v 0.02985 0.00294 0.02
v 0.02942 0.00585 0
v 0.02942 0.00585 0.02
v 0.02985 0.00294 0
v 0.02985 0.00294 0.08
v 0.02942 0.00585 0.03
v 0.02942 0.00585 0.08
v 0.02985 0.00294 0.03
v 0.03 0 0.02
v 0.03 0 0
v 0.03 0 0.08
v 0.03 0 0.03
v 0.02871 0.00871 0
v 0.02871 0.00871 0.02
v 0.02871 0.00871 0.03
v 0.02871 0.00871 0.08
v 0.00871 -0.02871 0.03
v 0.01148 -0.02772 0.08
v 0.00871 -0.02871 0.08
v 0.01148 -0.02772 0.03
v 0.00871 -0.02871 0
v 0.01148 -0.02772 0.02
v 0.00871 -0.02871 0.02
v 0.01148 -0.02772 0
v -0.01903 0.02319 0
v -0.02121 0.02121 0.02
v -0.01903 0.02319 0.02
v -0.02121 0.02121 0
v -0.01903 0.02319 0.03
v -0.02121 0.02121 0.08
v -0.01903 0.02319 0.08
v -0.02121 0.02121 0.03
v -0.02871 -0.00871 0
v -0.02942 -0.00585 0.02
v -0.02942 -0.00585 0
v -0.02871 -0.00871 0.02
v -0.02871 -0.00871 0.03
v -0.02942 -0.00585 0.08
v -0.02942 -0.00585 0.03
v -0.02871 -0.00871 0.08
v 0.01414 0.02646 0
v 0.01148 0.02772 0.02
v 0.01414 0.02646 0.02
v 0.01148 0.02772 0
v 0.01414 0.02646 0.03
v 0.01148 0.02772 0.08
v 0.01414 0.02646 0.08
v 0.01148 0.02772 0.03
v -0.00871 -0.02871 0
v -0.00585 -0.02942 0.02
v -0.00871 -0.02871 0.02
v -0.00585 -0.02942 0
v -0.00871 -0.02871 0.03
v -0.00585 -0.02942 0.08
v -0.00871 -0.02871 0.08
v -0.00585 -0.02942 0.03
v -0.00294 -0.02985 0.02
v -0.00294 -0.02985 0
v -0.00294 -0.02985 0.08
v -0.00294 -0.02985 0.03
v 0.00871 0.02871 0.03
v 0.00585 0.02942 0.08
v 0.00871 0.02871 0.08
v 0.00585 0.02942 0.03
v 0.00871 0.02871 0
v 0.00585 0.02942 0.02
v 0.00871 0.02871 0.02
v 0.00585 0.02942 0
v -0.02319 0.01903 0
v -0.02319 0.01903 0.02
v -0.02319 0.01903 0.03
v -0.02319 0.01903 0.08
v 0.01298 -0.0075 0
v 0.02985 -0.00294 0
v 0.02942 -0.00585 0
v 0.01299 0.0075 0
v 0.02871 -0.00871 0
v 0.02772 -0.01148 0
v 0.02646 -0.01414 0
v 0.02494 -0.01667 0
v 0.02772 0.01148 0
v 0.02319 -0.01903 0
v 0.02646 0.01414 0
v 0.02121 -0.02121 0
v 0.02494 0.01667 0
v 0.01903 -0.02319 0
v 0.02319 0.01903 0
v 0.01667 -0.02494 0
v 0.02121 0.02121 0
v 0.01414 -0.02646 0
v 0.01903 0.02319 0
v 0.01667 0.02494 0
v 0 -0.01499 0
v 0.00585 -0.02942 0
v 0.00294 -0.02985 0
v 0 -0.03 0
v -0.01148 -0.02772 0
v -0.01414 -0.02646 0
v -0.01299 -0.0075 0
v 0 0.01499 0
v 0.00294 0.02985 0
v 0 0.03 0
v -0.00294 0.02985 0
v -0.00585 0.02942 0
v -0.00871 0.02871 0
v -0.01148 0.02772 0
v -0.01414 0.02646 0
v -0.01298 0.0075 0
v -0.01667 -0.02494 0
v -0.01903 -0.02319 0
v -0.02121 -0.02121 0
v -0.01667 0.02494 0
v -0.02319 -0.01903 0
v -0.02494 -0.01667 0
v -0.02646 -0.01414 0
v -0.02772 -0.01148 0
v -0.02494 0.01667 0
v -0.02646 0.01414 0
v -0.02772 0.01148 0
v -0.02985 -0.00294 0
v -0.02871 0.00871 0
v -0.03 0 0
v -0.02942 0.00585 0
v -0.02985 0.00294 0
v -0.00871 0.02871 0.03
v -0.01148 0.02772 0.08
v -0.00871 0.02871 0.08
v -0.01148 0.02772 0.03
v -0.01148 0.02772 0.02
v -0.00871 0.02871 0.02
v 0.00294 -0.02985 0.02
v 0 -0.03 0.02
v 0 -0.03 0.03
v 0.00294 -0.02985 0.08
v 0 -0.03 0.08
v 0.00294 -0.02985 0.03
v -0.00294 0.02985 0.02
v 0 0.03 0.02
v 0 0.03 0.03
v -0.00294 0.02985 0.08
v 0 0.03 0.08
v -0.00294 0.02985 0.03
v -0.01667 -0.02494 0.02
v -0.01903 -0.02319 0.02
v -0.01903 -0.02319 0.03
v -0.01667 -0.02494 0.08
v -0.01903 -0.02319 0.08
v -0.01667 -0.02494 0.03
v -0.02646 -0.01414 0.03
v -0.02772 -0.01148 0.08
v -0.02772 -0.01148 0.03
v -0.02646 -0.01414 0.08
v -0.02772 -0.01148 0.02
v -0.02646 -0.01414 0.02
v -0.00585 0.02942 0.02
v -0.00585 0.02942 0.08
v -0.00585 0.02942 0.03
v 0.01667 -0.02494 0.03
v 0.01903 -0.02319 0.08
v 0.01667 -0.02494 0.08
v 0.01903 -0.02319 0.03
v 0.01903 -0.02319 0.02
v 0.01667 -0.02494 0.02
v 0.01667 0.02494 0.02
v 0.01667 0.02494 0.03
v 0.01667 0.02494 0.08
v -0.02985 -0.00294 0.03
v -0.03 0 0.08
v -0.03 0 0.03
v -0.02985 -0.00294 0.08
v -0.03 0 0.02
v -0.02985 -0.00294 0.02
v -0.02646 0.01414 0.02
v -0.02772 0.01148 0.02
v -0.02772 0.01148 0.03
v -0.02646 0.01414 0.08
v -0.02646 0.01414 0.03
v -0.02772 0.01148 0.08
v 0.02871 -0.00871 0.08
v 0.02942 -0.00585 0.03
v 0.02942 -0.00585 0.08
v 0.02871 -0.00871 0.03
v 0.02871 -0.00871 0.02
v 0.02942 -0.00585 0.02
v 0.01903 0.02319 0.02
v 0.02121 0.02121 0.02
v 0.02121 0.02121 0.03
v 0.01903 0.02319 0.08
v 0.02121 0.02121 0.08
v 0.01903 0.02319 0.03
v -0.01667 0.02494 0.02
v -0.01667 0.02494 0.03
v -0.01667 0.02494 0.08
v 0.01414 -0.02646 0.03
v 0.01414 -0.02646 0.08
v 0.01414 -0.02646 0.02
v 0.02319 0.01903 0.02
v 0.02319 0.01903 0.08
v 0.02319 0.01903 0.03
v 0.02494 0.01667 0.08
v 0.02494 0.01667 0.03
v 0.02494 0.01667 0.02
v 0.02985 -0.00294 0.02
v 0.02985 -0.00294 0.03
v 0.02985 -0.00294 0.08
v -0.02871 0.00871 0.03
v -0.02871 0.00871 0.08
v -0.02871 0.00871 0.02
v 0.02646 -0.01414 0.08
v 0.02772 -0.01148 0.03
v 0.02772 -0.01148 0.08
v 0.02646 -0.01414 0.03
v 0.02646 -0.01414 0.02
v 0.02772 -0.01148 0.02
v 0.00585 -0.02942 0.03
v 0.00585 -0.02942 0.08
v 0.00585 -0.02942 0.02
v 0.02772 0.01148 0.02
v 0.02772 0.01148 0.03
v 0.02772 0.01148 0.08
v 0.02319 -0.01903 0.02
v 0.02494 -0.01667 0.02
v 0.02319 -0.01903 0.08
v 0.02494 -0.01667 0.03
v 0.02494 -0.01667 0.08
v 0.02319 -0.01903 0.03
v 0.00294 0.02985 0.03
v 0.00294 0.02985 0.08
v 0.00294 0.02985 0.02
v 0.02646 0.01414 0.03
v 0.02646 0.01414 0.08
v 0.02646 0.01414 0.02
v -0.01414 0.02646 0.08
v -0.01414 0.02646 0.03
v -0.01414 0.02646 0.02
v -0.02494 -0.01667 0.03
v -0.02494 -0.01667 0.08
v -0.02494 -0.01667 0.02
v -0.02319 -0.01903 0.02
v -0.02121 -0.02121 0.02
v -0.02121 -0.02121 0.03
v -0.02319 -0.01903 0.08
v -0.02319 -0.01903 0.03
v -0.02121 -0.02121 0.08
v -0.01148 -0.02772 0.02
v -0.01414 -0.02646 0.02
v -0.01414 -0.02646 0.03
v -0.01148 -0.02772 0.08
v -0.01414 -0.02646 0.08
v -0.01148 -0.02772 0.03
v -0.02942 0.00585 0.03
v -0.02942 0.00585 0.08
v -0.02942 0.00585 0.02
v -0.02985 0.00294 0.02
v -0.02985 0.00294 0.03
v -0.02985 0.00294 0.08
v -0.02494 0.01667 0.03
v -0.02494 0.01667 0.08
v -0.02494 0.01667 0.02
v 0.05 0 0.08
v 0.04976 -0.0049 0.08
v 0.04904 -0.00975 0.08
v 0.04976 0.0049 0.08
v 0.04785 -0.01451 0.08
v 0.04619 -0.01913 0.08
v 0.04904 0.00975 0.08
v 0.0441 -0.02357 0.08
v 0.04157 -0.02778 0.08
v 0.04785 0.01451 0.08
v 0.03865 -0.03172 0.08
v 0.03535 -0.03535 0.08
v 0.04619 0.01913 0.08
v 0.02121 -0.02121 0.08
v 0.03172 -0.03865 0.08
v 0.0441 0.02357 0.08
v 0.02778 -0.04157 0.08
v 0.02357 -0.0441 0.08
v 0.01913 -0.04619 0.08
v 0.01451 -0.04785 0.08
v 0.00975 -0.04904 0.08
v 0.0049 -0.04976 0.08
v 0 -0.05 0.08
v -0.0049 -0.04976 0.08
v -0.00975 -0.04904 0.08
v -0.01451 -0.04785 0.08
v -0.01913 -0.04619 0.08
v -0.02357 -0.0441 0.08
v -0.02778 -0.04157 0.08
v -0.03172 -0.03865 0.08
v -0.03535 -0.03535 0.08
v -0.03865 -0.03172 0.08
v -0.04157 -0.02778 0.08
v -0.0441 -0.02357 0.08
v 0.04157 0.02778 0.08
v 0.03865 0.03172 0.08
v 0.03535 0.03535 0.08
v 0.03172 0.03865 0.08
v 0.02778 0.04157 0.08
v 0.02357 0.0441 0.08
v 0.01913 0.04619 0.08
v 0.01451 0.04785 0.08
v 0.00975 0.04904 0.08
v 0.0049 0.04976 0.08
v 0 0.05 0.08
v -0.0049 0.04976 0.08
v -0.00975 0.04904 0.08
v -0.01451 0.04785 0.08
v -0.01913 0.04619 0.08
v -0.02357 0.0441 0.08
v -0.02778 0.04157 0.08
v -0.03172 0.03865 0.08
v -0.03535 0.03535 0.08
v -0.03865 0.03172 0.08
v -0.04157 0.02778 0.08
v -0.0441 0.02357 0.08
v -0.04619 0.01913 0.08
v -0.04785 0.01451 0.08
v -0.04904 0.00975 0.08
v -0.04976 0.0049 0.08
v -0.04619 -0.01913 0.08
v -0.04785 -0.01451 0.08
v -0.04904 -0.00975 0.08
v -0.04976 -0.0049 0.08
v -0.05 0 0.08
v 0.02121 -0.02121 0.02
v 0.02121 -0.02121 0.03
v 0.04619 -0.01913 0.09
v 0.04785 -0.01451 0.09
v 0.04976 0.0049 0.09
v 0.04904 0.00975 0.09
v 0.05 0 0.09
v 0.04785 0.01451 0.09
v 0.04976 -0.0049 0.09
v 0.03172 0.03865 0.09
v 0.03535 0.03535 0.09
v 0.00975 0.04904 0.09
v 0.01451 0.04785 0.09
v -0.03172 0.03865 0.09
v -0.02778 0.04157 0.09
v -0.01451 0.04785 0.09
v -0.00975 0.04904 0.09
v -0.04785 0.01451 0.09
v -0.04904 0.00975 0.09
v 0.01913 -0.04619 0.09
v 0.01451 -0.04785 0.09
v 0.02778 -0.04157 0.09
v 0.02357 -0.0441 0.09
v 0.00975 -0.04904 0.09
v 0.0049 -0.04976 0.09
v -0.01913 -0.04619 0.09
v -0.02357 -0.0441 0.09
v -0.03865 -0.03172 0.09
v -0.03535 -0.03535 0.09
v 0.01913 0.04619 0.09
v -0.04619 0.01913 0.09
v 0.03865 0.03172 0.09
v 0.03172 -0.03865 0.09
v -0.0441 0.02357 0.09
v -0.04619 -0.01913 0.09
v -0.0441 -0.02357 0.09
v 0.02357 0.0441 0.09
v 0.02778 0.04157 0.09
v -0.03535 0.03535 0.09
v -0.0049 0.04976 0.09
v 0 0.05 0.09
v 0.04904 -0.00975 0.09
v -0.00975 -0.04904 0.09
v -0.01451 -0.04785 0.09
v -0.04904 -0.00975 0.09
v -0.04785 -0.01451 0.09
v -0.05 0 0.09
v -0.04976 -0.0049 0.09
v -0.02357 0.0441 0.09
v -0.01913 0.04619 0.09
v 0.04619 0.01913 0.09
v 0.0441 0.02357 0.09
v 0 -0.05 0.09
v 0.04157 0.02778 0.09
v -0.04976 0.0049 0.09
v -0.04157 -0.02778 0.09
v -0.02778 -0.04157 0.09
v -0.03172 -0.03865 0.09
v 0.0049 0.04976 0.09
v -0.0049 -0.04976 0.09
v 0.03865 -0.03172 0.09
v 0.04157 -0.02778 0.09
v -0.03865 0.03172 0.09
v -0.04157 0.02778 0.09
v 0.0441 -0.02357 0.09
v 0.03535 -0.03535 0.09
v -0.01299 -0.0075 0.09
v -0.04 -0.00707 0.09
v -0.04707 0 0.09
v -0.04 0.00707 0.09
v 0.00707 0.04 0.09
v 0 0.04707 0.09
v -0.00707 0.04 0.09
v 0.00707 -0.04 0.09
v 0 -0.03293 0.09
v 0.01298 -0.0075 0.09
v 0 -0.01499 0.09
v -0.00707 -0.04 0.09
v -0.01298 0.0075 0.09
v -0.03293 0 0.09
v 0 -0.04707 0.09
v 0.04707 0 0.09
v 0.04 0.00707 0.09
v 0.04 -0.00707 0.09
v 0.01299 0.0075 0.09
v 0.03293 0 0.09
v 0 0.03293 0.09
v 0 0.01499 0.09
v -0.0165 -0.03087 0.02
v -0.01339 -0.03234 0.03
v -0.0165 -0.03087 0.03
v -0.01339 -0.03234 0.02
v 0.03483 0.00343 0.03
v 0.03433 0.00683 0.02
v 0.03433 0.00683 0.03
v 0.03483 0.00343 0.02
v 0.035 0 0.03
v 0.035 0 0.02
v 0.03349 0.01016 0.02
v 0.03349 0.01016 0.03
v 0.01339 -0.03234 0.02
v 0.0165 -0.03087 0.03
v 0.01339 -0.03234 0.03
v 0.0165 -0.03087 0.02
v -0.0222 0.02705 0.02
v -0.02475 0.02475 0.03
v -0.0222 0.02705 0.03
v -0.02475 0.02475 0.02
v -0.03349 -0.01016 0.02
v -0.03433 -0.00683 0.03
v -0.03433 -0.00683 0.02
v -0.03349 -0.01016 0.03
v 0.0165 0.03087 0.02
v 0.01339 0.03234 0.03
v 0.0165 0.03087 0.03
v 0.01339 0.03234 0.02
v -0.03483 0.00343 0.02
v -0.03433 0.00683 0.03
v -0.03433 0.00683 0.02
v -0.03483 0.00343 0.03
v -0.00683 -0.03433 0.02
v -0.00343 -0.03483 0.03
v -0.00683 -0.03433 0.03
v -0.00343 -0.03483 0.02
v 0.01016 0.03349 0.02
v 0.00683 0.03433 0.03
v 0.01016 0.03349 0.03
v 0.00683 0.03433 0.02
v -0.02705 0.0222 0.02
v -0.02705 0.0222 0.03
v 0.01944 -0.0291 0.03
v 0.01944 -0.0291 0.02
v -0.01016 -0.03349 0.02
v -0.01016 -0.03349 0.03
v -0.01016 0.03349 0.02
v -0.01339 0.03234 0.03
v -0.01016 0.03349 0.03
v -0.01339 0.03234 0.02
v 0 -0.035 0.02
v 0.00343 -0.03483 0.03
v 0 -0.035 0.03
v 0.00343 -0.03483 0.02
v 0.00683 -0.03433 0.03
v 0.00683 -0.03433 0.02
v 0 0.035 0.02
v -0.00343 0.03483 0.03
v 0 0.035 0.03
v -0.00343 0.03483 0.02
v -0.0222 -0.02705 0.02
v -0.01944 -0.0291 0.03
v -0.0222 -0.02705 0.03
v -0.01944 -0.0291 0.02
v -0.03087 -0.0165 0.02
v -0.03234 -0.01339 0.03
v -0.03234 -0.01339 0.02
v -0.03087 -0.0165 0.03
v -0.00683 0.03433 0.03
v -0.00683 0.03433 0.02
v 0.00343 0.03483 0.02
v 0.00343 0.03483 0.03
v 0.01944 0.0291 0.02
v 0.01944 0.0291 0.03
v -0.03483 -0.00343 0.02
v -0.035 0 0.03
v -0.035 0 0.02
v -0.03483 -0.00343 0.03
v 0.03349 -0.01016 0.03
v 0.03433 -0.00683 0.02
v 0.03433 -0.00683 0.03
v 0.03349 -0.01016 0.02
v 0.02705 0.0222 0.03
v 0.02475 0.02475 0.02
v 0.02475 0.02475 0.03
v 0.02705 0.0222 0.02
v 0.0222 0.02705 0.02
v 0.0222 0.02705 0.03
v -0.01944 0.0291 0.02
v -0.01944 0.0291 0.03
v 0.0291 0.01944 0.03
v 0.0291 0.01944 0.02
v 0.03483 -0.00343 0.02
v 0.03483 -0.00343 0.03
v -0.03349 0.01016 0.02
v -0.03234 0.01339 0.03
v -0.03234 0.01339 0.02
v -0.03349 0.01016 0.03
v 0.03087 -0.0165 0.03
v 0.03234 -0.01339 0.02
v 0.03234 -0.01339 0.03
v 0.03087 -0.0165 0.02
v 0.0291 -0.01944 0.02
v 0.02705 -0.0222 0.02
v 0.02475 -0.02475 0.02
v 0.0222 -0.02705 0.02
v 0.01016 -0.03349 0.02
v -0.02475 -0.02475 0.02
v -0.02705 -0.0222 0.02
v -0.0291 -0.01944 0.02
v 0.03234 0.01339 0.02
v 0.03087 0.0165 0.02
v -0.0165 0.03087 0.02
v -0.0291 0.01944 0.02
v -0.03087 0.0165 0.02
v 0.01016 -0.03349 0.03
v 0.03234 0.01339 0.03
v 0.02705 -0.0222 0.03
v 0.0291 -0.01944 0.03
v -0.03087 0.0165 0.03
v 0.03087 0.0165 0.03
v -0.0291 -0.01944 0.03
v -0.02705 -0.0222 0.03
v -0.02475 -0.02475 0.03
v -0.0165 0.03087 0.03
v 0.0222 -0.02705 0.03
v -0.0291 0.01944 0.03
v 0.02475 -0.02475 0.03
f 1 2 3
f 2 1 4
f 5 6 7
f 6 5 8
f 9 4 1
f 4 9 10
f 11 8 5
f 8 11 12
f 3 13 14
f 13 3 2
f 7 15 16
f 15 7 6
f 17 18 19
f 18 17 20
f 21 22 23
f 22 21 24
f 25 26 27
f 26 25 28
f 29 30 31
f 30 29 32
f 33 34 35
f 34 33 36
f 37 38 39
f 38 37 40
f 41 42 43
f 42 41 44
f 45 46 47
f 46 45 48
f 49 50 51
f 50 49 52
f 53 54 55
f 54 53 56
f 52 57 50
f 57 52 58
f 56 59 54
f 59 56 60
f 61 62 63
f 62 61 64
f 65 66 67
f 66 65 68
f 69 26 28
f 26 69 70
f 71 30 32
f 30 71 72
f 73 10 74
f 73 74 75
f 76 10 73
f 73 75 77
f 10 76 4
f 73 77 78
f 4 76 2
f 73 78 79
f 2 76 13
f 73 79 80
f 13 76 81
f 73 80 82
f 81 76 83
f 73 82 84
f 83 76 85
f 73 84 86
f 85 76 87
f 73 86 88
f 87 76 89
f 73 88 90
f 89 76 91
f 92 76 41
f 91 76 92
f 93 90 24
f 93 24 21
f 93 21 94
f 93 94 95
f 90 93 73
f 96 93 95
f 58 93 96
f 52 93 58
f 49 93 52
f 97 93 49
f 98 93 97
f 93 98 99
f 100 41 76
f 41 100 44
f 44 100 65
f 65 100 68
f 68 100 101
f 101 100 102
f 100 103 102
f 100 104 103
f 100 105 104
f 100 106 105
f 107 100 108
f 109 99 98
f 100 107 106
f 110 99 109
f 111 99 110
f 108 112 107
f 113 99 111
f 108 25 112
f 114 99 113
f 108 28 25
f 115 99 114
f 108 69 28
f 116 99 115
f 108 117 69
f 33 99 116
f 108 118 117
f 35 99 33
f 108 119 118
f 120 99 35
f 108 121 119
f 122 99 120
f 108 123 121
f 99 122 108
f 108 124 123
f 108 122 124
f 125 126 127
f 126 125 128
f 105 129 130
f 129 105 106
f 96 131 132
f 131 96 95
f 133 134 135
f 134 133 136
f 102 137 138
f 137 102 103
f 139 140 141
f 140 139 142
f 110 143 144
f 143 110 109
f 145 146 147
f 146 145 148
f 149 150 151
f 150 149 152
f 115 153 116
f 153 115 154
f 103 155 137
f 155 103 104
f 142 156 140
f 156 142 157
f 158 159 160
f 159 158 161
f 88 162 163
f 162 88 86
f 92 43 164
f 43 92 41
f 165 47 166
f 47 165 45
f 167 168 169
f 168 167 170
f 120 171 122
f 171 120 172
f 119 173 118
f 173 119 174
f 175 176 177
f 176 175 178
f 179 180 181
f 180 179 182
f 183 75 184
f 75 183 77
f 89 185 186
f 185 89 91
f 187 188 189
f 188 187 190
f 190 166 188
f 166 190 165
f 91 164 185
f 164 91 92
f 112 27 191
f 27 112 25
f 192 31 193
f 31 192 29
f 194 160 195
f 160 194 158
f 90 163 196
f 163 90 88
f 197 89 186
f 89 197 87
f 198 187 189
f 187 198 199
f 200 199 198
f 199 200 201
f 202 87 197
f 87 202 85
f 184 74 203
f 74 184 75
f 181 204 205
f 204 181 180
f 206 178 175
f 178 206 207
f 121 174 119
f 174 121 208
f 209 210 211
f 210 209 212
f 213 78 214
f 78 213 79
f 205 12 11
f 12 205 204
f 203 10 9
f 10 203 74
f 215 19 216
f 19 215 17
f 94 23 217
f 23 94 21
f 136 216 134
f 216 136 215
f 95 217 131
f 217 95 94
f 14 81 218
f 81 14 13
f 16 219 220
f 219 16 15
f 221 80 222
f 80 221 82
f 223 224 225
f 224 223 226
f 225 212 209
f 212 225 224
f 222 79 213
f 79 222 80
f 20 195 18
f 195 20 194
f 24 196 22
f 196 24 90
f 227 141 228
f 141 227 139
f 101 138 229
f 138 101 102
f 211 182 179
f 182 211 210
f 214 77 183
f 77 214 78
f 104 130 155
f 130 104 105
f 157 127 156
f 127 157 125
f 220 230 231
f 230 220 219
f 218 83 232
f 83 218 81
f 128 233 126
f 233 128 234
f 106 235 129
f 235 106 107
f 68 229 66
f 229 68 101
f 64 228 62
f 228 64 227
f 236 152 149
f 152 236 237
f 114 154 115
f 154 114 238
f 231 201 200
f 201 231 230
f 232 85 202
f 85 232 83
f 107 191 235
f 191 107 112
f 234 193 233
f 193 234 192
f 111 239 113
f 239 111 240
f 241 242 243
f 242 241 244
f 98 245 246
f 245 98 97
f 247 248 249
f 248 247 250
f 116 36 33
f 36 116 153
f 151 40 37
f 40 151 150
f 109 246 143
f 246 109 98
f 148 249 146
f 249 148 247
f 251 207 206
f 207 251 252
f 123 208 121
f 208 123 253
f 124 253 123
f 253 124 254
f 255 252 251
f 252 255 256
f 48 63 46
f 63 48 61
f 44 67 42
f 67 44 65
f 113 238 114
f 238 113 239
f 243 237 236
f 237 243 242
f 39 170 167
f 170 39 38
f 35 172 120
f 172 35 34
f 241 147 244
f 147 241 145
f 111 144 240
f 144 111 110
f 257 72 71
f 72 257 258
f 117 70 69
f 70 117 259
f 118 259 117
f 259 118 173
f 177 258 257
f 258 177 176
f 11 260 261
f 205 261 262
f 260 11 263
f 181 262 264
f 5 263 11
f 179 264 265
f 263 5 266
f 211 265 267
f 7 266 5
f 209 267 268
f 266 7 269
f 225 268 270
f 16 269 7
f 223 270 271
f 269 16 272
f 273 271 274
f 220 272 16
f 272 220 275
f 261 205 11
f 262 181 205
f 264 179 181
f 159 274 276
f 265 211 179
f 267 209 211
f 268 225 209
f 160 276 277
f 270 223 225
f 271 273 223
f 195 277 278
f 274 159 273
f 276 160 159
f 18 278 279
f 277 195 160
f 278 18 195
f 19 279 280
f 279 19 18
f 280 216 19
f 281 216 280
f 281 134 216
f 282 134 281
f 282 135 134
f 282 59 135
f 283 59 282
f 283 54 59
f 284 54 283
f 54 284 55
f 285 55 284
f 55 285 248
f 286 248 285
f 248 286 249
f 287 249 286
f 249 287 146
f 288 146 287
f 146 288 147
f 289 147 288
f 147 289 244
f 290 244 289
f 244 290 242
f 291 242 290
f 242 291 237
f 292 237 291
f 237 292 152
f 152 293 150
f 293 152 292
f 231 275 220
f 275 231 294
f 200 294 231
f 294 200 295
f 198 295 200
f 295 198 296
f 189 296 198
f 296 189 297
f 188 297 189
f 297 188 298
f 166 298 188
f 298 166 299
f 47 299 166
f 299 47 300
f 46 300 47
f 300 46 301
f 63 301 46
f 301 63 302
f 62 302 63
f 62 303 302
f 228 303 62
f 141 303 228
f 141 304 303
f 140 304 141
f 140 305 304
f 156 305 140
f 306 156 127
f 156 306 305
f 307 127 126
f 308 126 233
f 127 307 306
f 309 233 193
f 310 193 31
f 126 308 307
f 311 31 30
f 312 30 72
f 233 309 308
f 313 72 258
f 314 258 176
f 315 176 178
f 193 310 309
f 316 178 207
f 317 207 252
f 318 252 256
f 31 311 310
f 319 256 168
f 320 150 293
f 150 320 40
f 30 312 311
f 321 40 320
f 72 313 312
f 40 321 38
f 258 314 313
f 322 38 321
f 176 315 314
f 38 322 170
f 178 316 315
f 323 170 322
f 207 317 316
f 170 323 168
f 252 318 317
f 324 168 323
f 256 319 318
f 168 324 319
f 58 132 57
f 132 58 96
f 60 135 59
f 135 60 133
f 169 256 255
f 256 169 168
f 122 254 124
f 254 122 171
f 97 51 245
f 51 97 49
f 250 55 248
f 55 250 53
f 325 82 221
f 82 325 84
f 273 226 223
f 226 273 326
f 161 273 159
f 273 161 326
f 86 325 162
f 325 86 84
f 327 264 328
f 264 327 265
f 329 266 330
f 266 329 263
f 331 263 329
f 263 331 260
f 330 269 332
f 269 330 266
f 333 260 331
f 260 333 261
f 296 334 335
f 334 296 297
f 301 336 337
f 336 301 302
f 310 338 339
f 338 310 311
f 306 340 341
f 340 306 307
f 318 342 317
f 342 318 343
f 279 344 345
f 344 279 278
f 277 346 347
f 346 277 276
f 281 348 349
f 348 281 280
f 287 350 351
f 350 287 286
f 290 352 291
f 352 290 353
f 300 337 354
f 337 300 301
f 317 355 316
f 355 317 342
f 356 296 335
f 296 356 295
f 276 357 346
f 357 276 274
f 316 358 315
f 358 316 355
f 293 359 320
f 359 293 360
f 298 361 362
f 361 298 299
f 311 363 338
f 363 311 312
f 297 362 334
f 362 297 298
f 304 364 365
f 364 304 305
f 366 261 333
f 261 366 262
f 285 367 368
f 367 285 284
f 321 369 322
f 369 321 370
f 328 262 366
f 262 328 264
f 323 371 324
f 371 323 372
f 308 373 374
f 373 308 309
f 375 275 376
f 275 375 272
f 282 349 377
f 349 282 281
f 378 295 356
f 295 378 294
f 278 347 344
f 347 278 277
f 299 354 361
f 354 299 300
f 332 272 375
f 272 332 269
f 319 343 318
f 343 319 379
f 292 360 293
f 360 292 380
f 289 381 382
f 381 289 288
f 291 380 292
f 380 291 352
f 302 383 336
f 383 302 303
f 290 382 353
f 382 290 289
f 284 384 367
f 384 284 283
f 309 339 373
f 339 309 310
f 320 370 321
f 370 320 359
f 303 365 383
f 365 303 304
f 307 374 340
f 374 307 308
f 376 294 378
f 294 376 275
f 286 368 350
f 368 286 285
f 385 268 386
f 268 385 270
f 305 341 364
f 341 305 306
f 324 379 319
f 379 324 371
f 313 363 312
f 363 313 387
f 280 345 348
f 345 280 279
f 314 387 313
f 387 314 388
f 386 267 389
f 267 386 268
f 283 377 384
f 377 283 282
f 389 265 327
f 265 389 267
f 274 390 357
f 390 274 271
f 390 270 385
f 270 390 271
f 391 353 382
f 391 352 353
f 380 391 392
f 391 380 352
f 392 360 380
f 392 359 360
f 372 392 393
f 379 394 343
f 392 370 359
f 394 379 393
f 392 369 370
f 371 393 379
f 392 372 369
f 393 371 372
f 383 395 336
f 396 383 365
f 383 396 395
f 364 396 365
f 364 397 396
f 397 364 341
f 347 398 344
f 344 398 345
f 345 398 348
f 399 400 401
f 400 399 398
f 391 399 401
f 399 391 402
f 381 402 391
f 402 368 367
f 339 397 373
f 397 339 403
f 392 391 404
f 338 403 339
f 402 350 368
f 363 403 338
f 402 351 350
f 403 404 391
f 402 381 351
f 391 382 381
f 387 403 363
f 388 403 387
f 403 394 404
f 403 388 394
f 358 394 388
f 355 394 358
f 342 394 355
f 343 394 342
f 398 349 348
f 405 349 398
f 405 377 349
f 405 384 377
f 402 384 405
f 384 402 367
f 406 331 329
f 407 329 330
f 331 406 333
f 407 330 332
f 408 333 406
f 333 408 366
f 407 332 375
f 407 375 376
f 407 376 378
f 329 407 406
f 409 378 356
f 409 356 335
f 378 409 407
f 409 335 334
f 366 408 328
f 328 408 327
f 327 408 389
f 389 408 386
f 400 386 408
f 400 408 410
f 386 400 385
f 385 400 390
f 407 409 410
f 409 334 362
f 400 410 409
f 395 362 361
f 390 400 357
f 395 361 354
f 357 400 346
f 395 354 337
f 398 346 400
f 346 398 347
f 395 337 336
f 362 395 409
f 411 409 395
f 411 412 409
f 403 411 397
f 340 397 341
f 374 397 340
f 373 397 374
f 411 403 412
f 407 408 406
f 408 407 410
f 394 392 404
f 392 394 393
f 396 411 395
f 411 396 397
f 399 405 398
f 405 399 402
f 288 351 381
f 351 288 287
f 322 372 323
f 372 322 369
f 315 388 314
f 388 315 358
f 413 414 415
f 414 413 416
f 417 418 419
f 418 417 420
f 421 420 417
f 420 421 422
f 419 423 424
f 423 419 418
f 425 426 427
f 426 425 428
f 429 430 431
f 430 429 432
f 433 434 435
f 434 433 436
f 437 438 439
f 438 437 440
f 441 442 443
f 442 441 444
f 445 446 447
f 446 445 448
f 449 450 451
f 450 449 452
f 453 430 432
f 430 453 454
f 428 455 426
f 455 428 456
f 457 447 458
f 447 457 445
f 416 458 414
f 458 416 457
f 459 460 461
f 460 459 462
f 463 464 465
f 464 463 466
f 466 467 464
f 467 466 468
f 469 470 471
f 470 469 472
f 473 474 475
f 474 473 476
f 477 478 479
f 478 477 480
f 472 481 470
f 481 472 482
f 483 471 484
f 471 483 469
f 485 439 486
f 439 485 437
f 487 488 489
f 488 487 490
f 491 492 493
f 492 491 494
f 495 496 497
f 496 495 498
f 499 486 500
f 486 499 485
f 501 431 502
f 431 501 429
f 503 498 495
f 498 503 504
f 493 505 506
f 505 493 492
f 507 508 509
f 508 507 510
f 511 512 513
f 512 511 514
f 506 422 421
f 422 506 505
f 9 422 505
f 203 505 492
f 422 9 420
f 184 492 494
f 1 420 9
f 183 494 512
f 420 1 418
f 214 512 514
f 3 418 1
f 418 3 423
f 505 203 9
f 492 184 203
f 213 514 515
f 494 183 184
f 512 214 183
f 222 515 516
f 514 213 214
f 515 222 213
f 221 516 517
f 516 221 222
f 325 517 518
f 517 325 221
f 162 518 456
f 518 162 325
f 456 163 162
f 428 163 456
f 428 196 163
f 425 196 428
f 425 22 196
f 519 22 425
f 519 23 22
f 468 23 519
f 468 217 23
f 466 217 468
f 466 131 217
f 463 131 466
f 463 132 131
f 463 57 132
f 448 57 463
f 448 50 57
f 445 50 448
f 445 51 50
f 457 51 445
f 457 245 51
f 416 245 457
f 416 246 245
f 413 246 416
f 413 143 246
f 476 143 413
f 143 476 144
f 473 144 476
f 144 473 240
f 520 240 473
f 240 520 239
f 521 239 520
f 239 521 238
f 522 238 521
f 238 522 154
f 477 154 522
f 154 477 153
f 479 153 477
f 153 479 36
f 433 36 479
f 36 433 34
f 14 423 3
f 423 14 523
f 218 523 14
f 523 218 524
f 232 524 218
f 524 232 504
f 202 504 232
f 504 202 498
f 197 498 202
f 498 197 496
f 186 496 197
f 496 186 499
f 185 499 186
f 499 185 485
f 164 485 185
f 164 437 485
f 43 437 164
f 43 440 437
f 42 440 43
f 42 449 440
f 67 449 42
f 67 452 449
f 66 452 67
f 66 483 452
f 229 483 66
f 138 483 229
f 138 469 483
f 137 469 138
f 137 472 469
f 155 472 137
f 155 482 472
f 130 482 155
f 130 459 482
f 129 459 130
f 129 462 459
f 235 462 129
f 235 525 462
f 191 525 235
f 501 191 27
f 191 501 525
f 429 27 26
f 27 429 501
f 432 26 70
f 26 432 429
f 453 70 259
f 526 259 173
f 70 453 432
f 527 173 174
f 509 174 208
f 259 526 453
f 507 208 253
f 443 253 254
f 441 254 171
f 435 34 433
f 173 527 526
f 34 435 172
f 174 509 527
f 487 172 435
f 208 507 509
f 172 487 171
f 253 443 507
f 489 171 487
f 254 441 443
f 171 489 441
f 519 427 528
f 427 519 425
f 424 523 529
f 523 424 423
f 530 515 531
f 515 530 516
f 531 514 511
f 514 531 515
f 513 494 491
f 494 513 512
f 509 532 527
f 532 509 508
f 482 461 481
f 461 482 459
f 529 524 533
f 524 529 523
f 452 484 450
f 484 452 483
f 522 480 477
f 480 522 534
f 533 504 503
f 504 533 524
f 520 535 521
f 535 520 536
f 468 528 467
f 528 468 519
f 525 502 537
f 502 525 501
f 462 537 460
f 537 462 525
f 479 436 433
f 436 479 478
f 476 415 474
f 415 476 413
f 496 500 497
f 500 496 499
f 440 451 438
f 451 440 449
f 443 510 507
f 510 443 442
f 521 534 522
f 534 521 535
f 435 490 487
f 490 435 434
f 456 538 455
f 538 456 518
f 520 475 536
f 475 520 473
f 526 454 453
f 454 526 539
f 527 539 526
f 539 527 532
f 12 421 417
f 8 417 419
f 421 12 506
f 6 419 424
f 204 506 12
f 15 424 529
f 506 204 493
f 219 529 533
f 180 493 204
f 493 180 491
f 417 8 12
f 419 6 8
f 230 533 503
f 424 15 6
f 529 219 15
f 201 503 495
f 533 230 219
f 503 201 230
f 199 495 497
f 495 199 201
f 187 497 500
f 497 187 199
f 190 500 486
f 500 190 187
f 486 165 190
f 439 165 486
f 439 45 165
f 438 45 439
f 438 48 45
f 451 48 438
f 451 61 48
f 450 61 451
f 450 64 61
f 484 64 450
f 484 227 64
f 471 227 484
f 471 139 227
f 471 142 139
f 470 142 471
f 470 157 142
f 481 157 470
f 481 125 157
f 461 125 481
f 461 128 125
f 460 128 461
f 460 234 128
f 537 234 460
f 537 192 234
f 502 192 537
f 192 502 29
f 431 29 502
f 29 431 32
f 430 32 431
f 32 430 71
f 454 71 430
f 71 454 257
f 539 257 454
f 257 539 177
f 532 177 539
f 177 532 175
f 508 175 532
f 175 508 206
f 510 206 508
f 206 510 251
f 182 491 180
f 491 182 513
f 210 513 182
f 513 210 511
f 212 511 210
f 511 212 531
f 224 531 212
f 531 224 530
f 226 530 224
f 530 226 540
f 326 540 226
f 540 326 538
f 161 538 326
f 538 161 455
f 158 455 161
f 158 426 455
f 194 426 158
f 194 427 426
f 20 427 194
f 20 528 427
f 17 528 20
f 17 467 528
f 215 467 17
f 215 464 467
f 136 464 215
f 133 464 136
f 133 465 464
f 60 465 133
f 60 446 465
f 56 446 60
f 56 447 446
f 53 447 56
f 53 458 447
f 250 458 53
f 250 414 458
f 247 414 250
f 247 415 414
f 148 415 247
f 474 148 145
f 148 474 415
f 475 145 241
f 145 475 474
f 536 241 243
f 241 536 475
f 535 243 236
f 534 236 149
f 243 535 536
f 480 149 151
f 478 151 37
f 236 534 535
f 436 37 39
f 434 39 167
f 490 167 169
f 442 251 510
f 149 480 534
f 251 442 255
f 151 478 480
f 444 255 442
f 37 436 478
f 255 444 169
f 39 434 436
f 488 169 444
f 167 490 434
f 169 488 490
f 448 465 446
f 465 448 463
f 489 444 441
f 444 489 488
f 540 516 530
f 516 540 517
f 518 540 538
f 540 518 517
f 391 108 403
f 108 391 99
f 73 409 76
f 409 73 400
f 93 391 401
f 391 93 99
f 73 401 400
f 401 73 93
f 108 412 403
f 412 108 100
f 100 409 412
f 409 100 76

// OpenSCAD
module flanged_hub() {
    difference() {
        union() {
            // Main cylinder
            cylinder(h=0.08, d=0.06, $fn=64);
            
            // Flange
            translate([0, 0, 0.08])
                cylinder(h=0.01, d=0.1, $fn=64);
            
            // Collar
            translate([0, 0, 0.02])
                cylinder(h=0.01, d=0.07, $fn=64);
        }
        
        // Hexagonal through-bore
        translate([0, 0, -0.01])
            rotate([0, 0, 30])
                linear_extrude(height=0.1)
                    polygon(points=[[0.015, 0], [0.0075, 0.013], [-0.0075, 0.013], [-0.015, 0], [-0.0075, -0.013], [0.0075, -0.013]]);
        
        // Diamond-shaped recesses
        for (i = [0, 90, 180, 270]) {
            rotate([0, 0, i])
                translate([0.04, 0, 0.09])
                    rotate([0, 0, 45])
                        linear_extrude(height=0.005)
                            square([0.01, 0.01], center=true);
        }
    }
}

flanged_hub();
